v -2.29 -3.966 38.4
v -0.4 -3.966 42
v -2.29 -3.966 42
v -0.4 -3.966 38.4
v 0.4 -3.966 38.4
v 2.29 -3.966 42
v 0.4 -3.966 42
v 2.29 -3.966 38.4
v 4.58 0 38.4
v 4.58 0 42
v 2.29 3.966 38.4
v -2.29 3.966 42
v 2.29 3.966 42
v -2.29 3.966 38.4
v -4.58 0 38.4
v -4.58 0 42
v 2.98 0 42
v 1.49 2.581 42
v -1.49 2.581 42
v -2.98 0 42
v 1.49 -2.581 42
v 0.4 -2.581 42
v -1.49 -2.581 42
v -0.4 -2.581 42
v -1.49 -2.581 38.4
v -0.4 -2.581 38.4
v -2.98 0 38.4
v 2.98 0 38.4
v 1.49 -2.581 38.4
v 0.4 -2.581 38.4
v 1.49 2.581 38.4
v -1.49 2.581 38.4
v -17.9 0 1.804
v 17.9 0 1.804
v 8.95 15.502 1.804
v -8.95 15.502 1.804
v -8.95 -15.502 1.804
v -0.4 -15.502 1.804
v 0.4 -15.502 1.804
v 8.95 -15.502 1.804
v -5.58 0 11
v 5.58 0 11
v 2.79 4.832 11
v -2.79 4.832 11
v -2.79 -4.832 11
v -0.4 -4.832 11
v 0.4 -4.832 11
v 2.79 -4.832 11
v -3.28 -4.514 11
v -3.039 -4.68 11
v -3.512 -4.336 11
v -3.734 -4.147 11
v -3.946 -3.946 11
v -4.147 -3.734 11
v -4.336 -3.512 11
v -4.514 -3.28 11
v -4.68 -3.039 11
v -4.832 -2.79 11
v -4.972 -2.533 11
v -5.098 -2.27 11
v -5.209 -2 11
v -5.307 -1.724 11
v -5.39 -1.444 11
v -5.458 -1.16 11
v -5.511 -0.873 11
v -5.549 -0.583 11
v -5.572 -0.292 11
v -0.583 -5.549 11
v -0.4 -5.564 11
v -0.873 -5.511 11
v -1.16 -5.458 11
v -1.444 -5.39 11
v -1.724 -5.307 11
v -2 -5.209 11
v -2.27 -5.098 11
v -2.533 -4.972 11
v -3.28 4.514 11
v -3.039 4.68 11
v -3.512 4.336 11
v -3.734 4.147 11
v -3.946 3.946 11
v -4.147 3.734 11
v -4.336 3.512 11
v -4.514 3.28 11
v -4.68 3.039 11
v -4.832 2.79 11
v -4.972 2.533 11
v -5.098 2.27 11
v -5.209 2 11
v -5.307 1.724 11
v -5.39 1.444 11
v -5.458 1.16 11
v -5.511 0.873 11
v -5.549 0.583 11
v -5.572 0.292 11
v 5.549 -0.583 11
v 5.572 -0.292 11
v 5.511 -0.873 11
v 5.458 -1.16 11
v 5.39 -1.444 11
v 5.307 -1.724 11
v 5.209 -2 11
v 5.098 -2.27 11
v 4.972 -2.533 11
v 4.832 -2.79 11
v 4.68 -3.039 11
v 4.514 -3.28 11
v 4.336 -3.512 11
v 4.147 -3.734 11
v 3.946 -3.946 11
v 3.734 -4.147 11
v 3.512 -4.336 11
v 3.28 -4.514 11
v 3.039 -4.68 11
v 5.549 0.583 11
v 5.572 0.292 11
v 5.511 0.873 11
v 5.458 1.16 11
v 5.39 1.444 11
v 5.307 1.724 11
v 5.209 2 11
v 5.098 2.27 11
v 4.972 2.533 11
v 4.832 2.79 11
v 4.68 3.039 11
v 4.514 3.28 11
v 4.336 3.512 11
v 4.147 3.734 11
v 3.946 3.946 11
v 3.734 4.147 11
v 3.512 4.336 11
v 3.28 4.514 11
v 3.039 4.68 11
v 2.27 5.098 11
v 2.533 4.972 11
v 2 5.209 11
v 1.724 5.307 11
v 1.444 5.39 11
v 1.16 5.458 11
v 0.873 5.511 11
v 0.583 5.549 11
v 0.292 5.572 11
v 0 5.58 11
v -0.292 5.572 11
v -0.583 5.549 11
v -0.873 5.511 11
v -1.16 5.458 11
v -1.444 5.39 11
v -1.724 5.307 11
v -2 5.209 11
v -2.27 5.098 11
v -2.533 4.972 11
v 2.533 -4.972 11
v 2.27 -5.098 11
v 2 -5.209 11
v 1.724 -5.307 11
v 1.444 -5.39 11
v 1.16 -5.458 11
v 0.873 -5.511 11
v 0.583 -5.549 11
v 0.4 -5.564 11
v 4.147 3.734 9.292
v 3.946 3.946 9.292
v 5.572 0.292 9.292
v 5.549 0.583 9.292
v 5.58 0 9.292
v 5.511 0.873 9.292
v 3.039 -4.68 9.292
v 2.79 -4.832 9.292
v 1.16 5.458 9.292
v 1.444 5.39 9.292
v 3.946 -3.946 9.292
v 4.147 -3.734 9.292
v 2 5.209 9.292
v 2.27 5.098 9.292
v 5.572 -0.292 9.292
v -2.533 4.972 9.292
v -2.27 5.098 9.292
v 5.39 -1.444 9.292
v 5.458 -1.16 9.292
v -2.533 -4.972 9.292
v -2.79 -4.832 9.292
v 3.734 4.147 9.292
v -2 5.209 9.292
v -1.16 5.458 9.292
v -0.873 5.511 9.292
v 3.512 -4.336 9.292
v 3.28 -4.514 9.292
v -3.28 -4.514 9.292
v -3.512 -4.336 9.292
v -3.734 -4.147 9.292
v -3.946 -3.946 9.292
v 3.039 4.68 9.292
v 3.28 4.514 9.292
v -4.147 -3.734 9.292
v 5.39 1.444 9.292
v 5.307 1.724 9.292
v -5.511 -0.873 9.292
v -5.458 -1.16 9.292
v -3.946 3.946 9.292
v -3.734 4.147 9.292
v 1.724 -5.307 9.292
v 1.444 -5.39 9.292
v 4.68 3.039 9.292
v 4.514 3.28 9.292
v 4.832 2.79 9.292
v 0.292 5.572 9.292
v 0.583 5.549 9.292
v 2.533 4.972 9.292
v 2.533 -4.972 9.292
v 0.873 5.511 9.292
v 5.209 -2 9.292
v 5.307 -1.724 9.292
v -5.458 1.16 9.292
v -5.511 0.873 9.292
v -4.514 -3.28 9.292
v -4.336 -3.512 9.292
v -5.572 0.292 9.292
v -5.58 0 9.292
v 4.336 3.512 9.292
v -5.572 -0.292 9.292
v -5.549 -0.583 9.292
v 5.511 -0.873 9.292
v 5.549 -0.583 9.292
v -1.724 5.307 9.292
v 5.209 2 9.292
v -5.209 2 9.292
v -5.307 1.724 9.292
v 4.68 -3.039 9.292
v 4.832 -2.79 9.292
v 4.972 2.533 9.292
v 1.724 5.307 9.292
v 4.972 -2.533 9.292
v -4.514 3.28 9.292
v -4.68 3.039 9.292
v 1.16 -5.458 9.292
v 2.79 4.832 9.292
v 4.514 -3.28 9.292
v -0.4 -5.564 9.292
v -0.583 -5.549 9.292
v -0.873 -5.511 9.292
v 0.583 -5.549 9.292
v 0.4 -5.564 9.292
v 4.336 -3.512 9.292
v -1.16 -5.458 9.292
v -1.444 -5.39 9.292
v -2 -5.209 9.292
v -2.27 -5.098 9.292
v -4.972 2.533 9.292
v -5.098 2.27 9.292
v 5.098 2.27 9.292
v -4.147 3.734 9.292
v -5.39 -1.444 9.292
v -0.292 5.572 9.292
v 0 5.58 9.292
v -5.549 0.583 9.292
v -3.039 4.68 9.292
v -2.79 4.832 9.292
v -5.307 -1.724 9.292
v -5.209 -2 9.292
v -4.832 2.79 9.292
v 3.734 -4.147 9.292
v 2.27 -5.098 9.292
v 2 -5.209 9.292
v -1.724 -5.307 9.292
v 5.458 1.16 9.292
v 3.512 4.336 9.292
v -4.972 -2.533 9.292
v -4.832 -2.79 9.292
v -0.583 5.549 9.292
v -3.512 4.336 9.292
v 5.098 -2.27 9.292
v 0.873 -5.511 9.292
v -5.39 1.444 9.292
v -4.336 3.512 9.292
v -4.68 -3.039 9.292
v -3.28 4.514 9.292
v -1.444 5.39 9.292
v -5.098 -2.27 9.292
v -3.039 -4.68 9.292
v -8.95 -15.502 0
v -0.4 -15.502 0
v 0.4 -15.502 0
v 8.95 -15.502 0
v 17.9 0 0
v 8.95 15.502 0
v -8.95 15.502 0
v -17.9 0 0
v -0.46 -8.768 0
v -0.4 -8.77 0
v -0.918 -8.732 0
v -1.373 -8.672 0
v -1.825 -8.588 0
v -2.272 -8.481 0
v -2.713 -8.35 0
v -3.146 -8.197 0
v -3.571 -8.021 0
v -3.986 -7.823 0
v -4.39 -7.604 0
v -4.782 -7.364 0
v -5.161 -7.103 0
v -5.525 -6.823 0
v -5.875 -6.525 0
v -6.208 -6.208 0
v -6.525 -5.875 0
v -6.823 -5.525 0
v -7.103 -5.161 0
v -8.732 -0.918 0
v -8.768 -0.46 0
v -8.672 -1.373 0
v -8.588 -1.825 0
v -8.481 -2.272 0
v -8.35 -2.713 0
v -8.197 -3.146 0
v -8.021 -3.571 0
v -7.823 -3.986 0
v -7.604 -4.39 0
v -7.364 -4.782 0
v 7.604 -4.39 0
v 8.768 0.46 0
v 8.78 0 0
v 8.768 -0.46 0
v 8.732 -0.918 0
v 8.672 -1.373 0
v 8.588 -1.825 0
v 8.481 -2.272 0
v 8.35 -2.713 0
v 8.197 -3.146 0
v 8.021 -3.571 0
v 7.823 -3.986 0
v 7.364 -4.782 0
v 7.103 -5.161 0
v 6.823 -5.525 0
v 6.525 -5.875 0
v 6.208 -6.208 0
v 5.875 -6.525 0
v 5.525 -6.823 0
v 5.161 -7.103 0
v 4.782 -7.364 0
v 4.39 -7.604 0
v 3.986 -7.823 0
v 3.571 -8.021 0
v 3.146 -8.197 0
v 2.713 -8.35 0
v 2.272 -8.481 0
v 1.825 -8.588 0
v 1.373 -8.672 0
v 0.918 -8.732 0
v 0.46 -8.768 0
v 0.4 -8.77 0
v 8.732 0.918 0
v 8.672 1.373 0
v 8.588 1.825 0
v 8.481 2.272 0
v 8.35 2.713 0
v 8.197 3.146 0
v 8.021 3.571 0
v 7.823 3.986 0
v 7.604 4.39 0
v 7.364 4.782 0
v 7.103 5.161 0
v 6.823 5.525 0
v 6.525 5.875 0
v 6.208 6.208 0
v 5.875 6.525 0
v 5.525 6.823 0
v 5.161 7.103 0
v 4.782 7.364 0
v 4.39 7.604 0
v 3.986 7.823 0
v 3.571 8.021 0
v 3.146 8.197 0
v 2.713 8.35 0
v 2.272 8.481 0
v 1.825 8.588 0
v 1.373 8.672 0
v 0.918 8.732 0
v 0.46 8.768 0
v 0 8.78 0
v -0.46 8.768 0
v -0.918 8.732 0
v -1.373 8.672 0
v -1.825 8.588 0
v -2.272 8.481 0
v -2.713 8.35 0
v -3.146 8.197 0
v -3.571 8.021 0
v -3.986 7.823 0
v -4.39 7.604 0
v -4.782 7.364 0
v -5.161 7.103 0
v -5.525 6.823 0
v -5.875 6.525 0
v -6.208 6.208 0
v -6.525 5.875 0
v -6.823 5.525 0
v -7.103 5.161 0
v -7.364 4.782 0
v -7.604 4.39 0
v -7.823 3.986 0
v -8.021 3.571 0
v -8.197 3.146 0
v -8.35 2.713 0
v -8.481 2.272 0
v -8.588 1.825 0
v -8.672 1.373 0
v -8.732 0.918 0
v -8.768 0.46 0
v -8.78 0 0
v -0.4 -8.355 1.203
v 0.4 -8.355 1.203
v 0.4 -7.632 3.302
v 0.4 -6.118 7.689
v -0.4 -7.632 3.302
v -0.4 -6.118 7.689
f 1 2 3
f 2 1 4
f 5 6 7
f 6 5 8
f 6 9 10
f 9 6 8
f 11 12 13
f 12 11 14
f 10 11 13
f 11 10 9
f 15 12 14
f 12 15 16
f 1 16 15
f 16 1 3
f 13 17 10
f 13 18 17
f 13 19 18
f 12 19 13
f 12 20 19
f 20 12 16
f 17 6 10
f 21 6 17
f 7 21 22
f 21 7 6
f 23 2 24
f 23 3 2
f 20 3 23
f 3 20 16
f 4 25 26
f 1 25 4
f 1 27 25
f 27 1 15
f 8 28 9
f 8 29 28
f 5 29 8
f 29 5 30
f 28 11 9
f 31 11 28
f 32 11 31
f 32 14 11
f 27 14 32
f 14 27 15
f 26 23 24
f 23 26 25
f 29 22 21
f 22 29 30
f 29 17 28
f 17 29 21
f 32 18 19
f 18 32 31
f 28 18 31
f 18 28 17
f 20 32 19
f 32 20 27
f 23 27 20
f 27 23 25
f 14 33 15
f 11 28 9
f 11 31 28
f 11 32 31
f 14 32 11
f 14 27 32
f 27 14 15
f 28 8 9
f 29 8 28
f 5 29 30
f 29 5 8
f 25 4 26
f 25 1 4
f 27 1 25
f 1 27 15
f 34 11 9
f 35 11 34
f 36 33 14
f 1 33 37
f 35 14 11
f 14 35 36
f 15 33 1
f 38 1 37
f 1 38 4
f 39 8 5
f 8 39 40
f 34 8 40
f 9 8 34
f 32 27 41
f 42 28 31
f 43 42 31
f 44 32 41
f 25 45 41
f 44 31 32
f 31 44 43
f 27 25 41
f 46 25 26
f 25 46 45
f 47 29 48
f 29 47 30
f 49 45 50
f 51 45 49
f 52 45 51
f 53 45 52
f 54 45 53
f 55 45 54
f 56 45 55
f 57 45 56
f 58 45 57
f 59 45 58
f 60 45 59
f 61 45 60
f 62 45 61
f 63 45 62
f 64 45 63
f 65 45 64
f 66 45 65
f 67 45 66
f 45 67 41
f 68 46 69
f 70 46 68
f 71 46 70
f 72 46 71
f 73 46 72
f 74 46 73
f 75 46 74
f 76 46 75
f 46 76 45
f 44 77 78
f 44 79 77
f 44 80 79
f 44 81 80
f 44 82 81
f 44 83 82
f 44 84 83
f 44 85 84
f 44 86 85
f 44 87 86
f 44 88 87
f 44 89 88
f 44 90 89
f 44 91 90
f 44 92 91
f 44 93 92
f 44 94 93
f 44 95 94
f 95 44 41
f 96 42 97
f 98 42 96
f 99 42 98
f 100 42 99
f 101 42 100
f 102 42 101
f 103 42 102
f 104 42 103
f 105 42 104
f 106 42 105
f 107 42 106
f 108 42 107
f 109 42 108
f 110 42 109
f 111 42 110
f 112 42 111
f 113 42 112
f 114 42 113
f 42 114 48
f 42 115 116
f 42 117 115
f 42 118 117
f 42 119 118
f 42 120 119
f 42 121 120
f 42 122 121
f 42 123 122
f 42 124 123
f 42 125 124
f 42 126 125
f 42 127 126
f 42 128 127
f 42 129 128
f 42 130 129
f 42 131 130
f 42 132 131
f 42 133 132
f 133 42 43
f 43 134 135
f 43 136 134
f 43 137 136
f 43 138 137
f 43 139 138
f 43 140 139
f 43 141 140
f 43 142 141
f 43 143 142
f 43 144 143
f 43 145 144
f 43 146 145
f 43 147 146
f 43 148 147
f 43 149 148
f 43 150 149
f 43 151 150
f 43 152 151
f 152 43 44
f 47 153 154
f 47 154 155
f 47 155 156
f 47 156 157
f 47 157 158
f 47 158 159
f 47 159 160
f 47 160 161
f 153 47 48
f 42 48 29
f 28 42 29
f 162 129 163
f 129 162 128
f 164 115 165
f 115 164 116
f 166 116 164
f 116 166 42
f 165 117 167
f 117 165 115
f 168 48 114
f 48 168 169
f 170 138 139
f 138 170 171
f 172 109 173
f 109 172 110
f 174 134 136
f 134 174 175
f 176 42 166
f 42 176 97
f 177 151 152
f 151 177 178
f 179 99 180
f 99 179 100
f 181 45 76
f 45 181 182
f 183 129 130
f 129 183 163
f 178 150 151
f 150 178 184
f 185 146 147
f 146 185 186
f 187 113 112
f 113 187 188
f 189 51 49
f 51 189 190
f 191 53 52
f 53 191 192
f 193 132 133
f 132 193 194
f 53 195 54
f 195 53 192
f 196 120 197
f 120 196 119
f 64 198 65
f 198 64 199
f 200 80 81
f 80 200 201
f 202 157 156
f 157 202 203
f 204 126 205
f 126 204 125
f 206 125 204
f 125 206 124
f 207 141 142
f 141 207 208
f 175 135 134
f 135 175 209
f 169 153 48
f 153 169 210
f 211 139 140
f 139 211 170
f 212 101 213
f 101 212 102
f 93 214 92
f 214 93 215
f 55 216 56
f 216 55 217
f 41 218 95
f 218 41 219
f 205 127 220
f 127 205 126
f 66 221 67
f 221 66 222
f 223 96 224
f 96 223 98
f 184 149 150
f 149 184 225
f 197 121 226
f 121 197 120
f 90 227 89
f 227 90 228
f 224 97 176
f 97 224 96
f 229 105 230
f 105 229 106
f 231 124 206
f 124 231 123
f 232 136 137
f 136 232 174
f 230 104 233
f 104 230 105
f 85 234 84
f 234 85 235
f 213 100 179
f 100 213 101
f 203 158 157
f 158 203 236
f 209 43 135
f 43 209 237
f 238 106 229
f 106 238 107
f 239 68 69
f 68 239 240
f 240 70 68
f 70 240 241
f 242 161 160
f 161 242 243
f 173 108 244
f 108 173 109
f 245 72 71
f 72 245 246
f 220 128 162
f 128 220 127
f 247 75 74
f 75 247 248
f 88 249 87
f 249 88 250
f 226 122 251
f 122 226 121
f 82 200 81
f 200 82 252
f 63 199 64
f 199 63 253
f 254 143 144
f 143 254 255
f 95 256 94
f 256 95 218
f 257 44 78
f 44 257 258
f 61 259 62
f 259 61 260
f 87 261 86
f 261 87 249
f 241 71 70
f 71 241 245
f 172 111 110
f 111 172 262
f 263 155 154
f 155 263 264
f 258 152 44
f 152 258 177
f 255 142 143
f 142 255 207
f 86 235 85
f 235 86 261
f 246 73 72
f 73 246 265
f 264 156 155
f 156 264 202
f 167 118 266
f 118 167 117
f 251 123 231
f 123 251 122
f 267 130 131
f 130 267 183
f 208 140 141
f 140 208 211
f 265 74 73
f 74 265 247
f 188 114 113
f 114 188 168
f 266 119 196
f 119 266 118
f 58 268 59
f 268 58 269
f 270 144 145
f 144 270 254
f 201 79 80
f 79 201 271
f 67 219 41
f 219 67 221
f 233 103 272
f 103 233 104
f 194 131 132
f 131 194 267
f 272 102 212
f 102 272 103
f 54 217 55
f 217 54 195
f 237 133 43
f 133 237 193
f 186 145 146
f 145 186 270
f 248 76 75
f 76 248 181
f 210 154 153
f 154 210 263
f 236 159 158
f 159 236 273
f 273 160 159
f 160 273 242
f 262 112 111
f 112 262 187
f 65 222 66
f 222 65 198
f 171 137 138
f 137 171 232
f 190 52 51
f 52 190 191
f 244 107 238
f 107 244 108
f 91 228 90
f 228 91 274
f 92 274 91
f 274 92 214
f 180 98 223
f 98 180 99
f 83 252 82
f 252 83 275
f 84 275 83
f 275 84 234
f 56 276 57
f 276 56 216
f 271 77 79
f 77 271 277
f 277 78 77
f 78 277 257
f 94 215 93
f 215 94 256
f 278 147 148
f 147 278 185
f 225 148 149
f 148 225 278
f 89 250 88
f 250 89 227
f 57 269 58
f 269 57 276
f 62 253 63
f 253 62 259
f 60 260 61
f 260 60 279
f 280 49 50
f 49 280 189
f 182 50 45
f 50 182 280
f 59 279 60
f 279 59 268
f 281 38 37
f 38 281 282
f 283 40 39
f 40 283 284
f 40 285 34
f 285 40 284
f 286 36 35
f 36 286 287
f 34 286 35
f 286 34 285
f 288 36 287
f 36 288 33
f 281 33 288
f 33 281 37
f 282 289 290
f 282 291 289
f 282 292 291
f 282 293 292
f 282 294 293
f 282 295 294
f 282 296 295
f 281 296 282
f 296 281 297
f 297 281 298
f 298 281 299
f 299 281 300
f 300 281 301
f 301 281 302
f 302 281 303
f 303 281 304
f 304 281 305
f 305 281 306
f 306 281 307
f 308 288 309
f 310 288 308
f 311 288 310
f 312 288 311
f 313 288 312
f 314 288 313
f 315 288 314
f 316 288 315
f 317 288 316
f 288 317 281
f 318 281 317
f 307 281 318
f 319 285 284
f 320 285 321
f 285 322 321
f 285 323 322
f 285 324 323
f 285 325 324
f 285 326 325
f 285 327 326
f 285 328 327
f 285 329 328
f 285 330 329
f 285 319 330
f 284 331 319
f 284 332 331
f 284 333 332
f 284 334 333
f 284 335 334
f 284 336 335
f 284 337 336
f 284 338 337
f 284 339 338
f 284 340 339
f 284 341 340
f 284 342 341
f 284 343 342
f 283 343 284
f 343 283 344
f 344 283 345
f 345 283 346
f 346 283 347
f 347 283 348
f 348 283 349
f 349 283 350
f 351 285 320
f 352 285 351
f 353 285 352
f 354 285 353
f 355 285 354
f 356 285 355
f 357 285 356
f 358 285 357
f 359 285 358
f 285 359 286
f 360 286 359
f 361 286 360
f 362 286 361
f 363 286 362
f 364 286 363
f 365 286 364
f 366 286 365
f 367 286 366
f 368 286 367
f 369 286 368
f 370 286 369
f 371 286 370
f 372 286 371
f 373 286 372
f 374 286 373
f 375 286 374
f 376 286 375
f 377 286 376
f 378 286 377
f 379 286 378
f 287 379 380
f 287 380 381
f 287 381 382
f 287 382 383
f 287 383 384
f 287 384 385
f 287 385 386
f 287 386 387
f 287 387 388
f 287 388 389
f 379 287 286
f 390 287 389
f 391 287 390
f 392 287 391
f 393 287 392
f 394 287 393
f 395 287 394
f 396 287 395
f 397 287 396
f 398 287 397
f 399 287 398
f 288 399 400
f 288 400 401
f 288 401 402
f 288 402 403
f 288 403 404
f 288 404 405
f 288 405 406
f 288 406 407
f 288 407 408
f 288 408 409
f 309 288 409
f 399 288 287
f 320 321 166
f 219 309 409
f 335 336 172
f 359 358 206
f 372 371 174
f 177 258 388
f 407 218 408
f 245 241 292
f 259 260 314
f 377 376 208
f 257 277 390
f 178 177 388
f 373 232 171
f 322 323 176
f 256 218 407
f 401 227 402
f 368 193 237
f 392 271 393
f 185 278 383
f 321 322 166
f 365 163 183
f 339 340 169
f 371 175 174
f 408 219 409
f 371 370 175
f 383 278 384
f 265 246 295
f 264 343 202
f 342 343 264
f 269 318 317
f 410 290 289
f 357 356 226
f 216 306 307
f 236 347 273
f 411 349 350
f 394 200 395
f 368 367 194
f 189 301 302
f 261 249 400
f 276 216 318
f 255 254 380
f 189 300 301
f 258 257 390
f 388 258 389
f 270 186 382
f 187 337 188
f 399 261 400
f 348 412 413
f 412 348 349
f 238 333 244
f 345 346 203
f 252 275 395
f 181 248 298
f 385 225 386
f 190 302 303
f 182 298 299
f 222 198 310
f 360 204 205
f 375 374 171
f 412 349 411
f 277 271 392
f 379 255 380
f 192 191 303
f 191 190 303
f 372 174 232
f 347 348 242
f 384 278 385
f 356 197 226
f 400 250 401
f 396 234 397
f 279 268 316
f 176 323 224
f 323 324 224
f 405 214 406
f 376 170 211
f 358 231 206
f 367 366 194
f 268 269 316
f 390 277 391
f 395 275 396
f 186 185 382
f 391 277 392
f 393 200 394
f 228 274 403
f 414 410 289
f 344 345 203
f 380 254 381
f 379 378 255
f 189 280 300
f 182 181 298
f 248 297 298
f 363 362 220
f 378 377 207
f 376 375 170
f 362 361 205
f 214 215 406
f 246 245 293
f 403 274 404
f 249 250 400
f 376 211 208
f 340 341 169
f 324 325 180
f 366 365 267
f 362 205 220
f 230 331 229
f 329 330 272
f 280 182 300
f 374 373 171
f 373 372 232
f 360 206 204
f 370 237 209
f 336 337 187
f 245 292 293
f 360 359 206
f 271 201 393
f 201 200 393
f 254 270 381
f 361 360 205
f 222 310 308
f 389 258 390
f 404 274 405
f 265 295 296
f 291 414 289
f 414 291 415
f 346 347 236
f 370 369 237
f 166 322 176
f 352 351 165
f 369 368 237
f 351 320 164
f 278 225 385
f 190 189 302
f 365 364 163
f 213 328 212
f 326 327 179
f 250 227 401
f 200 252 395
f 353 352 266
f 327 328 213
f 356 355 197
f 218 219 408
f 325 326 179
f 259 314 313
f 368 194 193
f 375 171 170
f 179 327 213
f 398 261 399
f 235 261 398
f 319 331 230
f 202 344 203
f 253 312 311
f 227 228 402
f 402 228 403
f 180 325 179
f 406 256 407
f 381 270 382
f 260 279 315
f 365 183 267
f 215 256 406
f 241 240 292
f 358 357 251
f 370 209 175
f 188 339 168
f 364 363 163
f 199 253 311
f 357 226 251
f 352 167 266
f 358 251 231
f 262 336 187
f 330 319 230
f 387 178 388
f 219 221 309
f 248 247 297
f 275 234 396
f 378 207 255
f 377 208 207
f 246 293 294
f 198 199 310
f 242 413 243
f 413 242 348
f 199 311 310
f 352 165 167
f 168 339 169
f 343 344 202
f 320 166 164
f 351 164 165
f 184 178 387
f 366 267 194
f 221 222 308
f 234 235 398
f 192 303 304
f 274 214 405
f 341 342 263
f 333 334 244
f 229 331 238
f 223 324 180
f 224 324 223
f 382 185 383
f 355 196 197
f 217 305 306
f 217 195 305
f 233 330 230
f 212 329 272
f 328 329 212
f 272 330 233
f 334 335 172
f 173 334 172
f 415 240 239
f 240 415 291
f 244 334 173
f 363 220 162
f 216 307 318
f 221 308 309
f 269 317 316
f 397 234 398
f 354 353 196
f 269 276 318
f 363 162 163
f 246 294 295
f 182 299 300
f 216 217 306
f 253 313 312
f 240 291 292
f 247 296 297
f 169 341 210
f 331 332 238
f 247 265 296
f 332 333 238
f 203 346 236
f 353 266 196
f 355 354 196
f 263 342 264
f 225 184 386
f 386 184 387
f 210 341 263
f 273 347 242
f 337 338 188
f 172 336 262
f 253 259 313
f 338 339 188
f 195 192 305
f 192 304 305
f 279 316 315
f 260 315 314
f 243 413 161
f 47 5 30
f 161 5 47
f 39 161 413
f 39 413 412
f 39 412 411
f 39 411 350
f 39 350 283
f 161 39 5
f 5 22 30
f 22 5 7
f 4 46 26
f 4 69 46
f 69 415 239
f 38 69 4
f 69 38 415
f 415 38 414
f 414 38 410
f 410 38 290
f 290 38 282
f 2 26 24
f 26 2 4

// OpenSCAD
// printer parameters
d_nozzle = 0.8;
h_layer = 0.6;
z_limit = 210;
// TODO: needs to be refactored to use include statement https://github.com/openscad/openscad/issues/605#issuecomment-32962394

// design parameters
scale_factor = 0.2;
tolerance = 0.5;

t_wall = d_nozzle;
d_raft = 200*scale_factor;
d_funnel = d_raft-4*t_wall;

t_wall_clearance = t_wall;

overhang_extent=4*t_wall;
overhang_angle = 70;

h_wicking_chamber = 55*scale_factor;
d_wicking_chamber = 50.8;
d_drainpipe = d_wicking_chamber*scale_factor;

h_cone=tan(overhang_angle)*(d_funnel/2-d_drainpipe/2);

t_top = 6*h_layer;
t_bottom = z_limit*scale_factor-h_cone-t_top;

// Hidden variables:
$fn=6;

module chamfer() {
    h_chamfer=tan(overhang_angle)*overhang_extent+tolerance;

    // cone along wicking chamber
    cylinder(r2=d_drainpipe/2+tolerance, r1=d_drainpipe/2+overhang_extent+tolerance, h=h_chamfer, $fn=120);
}

module funnel() {
    // top donut
    translate([0, 0, h_cone+t_bottom])
    difference() {
        cylinder(r=d_drainpipe/2-tolerance, h=t_top);
        cylinder(r=d_drainpipe/2-2*t_wall-tolerance, h=t_top);
    }

    // conical donut
    difference() {
        translate([0, 0, t_bottom])
        cylinder(r2=d_drainpipe/2-tolerance, r1=d_funnel/2-tolerance, h=h_cone);

//    // keyhole wall 1
//    translate([t_wall, -d_funnel/2, 0])
//    cube([t_wall, d_funnel/2-d_drainpipe/2, h_cone+t_bottom]);

//    // keyhole wall 2
//    translate([-2*t_wall, -d_funnel/2, 0])
//    cube([t_wall, d_funnel/2-d_drainpipe/2, h_cone+t_bottom]);

        // drainage donut below wicking chamber
        translate([0, 0, h_wicking_chamber])
        cylinder(r2=d_drainpipe/2-2*t_wall-tolerance, r1=d_drainpipe/2+tolerance, h=h_cone+t_bottom-h_wicking_chamber);

        // wicking chamber donut
        cylinder(r=d_drainpipe/2+tolerance, h=h_wicking_chamber, $fn=120);
    }

//    // support donut
//    difference() {
//        cylinder(r=d_funnel/2+t_wall, h=h_cone+t_bottom);
//        cylinder(r=d_funnel/2, h=h_cone+t_bottom);
//    }

    // base cylinder
    difference() {
        cylinder(r=d_funnel/2-tolerance, h=t_bottom);
        cylinder(r=d_drainpipe/2+tolerance, h=t_bottom);
    }
}

difference() {
    funnel();

    chamfer();

    // keyhole for vasemode printing
    w_keyhole = d_funnel/2-d_drainpipe/2-overhang_extent;
    h_vert_cut = h_cone+t_top+t_bottom;
    translate([-t_wall_clearance/2, -d_funnel/2, 0])
    cube([t_wall_clearance, d_funnel/2, h_vert_cut]);

//    // keyhole with triangle cutout
//    translate([0, -d_drainpipe/2-overhang_extent-w_keyhole*1.55, 0])
//    rotate([0, 0, 90])
//    cylinder(h=tan(overhang_angle)*w_keyhole, r1=w_keyhole, r2=0, $fn=6);
}
